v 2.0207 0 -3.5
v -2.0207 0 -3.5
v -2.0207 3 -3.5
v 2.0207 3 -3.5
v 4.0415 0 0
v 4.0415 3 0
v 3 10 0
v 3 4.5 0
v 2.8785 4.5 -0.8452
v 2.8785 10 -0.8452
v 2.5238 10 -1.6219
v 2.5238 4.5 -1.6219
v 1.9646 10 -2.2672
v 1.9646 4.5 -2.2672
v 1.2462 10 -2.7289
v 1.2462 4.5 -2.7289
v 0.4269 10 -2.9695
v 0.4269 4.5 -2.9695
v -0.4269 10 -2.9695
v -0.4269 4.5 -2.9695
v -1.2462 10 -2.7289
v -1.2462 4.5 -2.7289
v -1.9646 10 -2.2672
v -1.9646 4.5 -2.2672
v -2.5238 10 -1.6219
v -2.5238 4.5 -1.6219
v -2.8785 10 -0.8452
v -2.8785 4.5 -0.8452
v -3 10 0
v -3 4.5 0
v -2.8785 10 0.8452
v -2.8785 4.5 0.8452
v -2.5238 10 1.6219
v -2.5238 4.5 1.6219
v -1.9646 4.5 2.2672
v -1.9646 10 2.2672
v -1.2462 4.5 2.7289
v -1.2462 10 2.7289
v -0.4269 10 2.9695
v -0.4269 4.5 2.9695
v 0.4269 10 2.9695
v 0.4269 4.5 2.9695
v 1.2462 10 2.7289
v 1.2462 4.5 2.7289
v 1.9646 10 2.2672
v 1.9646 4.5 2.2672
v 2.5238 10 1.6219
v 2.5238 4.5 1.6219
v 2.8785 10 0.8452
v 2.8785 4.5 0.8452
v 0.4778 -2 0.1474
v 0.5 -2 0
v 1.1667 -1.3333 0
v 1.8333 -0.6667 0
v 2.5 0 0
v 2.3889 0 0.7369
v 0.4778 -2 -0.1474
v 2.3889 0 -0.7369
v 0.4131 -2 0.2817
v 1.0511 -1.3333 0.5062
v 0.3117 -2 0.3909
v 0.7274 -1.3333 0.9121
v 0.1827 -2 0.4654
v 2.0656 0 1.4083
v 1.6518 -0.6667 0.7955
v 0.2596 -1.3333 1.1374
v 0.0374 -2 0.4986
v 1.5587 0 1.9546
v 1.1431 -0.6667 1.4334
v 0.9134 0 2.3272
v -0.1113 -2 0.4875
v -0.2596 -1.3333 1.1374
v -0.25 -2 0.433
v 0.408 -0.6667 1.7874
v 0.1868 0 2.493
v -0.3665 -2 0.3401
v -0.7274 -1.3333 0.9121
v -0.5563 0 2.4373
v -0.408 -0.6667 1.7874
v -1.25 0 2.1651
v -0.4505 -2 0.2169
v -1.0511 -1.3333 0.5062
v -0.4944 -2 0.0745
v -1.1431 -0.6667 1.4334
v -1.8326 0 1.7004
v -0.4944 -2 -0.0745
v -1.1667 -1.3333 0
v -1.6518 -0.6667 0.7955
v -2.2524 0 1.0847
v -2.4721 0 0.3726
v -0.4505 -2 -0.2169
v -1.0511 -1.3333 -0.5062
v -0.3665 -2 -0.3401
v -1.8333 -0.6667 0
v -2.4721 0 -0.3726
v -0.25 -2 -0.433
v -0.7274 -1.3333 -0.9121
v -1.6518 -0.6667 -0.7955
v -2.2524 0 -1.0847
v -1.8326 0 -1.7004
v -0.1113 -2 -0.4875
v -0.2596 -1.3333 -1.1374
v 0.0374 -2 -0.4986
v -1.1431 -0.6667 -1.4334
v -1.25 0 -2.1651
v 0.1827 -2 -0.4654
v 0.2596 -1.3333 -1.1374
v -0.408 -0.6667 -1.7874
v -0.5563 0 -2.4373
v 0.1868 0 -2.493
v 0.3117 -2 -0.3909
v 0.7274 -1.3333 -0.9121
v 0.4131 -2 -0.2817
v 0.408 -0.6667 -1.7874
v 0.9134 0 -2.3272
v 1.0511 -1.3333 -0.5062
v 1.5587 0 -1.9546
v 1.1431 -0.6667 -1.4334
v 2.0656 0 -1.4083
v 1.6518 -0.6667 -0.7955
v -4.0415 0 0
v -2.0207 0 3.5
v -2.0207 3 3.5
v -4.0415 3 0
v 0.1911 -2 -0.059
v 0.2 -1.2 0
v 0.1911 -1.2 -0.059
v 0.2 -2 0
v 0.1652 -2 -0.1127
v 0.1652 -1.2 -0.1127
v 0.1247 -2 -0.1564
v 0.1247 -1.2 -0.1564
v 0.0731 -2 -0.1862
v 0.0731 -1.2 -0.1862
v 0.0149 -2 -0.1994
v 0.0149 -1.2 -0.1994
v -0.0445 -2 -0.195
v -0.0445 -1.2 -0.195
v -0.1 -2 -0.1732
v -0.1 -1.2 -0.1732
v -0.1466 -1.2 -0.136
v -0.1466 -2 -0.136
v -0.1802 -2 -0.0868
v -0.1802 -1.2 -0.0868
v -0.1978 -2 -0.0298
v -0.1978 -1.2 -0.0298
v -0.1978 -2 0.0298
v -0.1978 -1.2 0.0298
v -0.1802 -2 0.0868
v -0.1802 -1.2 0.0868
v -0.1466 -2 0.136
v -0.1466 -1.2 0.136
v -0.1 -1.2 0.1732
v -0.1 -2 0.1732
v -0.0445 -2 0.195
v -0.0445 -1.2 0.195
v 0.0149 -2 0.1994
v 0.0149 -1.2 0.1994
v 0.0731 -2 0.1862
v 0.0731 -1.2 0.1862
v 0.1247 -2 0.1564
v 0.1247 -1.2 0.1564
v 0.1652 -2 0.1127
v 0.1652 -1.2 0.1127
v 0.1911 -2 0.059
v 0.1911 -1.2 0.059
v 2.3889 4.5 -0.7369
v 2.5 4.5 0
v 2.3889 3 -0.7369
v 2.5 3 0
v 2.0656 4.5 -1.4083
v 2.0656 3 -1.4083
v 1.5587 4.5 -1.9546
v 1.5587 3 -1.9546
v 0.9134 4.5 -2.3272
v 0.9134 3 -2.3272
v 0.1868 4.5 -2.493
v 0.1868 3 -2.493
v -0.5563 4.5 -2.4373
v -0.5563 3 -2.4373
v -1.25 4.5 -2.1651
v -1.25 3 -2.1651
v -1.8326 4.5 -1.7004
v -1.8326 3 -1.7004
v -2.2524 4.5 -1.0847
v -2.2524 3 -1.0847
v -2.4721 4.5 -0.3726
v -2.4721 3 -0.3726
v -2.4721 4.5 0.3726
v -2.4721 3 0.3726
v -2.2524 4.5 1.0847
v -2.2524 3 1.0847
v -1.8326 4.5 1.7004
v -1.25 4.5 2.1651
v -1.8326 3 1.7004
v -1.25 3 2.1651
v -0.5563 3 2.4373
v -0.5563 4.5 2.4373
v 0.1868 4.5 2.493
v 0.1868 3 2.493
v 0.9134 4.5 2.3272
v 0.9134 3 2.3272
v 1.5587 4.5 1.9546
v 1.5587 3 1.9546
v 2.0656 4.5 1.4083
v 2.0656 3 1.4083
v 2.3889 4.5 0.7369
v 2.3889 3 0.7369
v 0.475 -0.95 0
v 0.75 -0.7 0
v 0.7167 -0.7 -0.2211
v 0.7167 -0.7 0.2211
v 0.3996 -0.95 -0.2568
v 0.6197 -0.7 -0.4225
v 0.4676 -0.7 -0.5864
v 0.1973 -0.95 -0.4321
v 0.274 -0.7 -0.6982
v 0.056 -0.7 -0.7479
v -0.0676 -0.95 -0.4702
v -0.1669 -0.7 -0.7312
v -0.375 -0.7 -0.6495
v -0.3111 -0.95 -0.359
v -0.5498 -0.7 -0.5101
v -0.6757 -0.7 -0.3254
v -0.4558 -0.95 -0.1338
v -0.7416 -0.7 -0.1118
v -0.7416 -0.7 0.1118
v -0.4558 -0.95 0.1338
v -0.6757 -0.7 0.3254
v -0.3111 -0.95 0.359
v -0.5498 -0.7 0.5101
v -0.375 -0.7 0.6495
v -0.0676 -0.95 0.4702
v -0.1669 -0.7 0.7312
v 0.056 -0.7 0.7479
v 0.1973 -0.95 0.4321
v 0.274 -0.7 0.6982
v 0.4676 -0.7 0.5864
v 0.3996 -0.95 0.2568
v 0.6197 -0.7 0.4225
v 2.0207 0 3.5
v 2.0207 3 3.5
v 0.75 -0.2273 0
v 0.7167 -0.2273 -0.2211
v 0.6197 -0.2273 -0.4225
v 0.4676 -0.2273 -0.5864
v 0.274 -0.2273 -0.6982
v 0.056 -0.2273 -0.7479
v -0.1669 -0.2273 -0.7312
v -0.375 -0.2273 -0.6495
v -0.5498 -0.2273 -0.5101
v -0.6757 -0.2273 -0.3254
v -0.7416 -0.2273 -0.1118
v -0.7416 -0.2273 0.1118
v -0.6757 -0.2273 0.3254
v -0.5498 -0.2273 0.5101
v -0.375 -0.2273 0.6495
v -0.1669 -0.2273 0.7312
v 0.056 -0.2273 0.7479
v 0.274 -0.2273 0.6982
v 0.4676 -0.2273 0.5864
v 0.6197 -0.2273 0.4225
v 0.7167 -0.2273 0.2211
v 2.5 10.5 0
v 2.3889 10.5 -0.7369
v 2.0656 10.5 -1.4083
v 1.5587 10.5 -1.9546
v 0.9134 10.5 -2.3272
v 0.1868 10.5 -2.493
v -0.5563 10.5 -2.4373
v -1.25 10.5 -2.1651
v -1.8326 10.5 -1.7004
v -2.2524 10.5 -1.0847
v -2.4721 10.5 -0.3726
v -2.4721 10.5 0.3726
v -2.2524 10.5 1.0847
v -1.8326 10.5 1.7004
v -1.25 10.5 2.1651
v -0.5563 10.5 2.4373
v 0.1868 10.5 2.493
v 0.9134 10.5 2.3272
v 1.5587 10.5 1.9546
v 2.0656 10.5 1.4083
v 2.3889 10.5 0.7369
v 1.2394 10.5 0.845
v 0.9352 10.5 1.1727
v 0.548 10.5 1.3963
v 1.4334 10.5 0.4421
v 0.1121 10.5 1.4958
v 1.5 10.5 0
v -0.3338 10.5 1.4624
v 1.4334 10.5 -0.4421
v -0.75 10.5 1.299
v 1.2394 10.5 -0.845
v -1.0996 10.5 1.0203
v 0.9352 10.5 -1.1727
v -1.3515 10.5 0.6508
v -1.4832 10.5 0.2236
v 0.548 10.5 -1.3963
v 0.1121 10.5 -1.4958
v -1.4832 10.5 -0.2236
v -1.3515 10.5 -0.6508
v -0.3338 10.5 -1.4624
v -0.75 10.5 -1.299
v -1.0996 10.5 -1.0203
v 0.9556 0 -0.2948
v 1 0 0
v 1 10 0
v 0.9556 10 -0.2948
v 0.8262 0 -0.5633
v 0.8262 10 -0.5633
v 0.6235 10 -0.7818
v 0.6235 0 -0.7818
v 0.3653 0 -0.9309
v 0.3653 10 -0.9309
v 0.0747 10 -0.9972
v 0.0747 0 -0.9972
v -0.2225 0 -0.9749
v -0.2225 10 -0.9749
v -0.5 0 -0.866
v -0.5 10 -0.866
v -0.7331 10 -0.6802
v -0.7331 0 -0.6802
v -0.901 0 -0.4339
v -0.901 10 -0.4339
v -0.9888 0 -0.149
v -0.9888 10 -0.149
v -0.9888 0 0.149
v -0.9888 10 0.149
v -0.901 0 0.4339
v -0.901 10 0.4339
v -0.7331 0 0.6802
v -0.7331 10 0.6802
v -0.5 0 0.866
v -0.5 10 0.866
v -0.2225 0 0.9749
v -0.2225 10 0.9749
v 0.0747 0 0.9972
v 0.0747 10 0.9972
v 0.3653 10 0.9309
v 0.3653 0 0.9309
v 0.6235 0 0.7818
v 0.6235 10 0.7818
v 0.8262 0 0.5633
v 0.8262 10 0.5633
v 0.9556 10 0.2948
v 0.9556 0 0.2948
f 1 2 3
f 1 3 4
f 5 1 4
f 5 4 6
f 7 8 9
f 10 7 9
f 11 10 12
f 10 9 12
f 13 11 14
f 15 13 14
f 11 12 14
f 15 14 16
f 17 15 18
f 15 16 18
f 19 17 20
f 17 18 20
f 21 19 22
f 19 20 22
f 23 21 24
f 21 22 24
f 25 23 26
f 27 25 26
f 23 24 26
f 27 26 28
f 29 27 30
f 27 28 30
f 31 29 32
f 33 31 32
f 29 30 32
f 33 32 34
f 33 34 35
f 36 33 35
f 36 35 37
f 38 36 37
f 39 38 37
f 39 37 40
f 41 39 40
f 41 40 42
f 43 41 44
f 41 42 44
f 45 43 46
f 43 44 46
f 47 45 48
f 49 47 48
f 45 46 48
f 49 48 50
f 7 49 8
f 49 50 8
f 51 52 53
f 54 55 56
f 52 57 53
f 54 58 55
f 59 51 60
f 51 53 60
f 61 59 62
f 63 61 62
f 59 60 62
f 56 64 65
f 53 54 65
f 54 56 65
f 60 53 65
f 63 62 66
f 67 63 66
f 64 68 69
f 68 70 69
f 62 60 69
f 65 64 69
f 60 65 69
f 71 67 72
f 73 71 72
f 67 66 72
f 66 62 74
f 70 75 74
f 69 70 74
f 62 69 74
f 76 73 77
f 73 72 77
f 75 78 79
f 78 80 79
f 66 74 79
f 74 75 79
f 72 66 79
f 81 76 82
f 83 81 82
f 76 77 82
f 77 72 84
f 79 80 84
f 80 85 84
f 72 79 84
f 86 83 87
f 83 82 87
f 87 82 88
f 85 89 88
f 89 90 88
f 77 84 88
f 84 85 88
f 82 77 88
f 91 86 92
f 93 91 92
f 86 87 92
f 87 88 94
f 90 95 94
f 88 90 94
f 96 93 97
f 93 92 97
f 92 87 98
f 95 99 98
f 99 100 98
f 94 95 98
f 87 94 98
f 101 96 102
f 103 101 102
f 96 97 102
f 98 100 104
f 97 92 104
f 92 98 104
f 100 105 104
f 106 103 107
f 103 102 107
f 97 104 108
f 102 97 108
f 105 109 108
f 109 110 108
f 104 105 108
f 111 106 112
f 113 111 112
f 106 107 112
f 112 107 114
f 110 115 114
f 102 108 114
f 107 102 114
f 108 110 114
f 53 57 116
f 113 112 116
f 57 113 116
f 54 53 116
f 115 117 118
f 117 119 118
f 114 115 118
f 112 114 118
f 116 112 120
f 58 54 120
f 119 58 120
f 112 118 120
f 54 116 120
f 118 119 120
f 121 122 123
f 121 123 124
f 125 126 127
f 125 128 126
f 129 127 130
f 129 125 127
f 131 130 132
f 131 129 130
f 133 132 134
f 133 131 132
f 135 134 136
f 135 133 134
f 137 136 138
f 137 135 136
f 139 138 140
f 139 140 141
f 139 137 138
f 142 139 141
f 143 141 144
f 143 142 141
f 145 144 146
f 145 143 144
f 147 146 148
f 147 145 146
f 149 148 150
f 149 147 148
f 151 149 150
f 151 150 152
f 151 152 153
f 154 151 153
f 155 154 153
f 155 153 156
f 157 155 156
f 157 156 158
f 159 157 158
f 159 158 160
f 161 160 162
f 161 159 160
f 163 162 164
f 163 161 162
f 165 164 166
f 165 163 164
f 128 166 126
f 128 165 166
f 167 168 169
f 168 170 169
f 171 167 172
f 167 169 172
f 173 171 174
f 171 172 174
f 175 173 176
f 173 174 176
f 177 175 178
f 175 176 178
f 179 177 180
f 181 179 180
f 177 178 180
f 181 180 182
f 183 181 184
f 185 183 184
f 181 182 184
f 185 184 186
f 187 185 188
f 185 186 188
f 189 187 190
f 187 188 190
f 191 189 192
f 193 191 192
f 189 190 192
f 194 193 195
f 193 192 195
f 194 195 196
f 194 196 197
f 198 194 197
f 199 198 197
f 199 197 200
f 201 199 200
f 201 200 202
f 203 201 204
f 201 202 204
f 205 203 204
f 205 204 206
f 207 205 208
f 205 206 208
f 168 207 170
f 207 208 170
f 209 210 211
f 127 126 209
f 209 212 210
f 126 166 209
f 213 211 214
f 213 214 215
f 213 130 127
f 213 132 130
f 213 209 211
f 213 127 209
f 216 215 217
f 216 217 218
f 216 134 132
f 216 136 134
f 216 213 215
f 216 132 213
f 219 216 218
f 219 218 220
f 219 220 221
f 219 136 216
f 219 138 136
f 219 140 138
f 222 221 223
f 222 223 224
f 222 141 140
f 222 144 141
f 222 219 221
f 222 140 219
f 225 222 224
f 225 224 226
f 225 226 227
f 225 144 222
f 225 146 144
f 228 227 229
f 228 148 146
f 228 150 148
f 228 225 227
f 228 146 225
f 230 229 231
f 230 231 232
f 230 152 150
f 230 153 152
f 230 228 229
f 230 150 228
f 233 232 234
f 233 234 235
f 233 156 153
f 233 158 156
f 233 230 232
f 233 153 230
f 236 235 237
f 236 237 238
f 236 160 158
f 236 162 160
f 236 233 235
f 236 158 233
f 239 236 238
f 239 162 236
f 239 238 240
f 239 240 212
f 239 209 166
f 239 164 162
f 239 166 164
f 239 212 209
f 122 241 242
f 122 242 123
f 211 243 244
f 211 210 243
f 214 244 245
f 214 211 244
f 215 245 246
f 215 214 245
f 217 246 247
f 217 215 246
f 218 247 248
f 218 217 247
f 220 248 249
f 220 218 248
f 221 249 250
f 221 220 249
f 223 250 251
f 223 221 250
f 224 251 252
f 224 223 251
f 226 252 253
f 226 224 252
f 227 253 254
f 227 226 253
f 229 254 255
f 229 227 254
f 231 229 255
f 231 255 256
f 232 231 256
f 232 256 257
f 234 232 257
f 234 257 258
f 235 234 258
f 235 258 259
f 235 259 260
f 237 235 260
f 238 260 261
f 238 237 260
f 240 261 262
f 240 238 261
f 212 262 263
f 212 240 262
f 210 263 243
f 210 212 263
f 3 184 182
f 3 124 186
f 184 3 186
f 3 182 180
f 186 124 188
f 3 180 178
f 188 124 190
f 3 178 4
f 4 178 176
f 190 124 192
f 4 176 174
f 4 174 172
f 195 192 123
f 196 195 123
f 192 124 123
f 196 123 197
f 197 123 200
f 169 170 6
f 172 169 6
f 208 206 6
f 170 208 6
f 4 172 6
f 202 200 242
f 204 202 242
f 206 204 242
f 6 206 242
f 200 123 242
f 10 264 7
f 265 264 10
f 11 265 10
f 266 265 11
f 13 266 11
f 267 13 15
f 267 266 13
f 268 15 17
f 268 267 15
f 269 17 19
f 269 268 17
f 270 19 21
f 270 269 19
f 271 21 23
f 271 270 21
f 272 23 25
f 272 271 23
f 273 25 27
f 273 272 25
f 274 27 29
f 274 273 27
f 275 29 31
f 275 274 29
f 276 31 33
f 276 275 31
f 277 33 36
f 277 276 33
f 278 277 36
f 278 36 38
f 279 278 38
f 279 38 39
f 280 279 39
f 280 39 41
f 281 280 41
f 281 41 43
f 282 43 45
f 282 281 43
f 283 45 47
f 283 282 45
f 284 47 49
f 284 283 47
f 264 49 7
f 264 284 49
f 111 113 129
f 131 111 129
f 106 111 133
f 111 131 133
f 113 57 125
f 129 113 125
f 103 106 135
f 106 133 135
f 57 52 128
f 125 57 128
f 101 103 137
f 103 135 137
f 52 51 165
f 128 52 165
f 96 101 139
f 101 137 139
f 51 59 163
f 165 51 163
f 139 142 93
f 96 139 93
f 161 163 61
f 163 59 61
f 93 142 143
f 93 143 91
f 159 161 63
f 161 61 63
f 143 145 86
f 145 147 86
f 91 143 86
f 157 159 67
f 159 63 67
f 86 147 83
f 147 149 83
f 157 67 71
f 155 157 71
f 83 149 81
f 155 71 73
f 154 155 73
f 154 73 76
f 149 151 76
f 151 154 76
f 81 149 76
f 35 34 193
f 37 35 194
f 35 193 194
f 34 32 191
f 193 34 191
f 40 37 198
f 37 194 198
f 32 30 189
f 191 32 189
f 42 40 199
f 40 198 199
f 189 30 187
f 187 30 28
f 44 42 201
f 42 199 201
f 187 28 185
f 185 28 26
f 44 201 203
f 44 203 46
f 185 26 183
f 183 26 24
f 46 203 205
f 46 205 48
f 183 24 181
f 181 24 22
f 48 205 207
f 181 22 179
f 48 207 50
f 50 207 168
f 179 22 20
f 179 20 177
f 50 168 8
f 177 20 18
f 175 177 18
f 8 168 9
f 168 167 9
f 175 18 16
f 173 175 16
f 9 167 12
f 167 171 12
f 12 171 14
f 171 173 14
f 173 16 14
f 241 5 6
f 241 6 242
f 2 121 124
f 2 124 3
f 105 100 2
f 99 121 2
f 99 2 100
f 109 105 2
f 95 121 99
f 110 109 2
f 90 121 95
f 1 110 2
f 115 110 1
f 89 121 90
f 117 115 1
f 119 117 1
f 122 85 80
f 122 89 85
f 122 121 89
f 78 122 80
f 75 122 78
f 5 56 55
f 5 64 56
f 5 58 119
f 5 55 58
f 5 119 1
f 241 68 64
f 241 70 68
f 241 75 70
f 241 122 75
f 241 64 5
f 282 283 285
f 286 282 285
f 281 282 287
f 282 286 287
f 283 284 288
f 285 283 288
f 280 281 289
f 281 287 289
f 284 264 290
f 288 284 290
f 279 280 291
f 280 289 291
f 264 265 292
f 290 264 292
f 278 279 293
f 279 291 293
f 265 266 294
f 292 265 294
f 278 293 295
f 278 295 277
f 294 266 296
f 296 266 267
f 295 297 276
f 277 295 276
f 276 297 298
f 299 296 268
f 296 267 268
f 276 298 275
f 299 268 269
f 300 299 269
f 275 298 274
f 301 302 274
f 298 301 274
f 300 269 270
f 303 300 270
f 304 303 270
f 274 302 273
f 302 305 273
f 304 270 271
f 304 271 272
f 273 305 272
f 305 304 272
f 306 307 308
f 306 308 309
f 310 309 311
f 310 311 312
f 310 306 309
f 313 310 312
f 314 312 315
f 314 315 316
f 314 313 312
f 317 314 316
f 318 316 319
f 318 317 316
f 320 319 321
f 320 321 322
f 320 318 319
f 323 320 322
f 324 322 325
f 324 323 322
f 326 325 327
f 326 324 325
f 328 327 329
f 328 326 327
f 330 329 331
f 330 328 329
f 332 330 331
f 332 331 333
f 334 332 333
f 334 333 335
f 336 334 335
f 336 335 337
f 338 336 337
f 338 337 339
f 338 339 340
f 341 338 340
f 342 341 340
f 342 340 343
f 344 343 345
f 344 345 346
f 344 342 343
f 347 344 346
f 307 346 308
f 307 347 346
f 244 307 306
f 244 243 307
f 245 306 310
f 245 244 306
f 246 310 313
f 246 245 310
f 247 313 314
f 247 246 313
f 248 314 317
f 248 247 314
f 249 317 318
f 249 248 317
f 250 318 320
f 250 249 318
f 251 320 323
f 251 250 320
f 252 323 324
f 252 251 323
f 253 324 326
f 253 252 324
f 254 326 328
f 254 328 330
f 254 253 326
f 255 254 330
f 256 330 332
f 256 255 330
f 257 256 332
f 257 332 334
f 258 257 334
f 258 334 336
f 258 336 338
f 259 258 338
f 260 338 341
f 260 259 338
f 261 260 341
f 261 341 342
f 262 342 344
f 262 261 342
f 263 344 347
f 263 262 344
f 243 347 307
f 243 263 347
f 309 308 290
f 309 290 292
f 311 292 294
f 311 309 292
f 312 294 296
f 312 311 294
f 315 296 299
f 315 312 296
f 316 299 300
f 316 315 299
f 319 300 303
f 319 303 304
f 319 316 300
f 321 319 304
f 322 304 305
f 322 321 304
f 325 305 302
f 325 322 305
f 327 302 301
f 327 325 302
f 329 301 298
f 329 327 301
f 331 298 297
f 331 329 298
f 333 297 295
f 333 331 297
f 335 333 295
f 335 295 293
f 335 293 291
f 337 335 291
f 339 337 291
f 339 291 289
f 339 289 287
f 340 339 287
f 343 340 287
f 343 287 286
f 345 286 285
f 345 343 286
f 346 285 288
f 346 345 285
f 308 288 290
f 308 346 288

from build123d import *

# Parameters (mm, degrees)
BOSS_EXTRUDE1_DEPTH = 3
CHAMFER1_SIZE       = 0.5


with BuildPart() as part:
    # Sketch1 → Boss-Extrude1 (new body)
    with BuildSketch(Plane.XZ):
        Polygon((-2.020725942, 3.5), (-4.041451884, 0), (-2.020725942, -3.5), (2.020725942, -3.5), (4.041451884, 0), (2.020725942, 3.5), align=None)
    extrude(amount=-BOSS_EXTRUDE1_DEPTH)

    # Sketch2 → Revolve1 (revolve)
    with BuildSketch(Plane(origin=(0, 0, 0), x_dir=(-1, 0, 0), z_dir=(0, 0, -1))):
        Polygon((-2.5, 3), (0, 3), (0, 10.5), (-3, 10.5), (-3, 4.5), (-2.5, 4.5), align=None)
    revolve(axis=Axis((0, 3, 0), (0, 1, 0)))

    # Sketch3 → Revolve2 (revolve)
    with BuildSketch(Plane.XY):
        Polygon((2.5, 0), (0, 0), (0, -2), (0.5, -2), align=None)
    revolve(axis=Axis((0, 0, 0), (0, -1, 0)))

    # Sketch4 → Cut-Revolve1 (revolve, cut)
    with BuildSketch(Plane(origin=(0, 0, 0), x_dir=(-1, 0, 0), z_dir=(0, 0, -1))):
        Polygon((-0.2, -2), (0, -2), (0, 10.5), (-1, 10.5), (-1, 0), (-0.75, -0.227272727), (-0.75, -0.7), (-0.2, -1.2), align=None)
    revolve(axis=Axis((0, -2, 0), (0, 1, 0)), mode=Mode.SUBTRACT)

    # Chamfer1
    chamfer1_edges = [part.edges().sort_by_distance(p)[0] for p in [
        (-3, 10.5, 0),
        (-1, 10.5, 0),
    ]]
    chamfer(chamfer1_edges, length=CHAMFER1_SIZE)


solid = part.part
